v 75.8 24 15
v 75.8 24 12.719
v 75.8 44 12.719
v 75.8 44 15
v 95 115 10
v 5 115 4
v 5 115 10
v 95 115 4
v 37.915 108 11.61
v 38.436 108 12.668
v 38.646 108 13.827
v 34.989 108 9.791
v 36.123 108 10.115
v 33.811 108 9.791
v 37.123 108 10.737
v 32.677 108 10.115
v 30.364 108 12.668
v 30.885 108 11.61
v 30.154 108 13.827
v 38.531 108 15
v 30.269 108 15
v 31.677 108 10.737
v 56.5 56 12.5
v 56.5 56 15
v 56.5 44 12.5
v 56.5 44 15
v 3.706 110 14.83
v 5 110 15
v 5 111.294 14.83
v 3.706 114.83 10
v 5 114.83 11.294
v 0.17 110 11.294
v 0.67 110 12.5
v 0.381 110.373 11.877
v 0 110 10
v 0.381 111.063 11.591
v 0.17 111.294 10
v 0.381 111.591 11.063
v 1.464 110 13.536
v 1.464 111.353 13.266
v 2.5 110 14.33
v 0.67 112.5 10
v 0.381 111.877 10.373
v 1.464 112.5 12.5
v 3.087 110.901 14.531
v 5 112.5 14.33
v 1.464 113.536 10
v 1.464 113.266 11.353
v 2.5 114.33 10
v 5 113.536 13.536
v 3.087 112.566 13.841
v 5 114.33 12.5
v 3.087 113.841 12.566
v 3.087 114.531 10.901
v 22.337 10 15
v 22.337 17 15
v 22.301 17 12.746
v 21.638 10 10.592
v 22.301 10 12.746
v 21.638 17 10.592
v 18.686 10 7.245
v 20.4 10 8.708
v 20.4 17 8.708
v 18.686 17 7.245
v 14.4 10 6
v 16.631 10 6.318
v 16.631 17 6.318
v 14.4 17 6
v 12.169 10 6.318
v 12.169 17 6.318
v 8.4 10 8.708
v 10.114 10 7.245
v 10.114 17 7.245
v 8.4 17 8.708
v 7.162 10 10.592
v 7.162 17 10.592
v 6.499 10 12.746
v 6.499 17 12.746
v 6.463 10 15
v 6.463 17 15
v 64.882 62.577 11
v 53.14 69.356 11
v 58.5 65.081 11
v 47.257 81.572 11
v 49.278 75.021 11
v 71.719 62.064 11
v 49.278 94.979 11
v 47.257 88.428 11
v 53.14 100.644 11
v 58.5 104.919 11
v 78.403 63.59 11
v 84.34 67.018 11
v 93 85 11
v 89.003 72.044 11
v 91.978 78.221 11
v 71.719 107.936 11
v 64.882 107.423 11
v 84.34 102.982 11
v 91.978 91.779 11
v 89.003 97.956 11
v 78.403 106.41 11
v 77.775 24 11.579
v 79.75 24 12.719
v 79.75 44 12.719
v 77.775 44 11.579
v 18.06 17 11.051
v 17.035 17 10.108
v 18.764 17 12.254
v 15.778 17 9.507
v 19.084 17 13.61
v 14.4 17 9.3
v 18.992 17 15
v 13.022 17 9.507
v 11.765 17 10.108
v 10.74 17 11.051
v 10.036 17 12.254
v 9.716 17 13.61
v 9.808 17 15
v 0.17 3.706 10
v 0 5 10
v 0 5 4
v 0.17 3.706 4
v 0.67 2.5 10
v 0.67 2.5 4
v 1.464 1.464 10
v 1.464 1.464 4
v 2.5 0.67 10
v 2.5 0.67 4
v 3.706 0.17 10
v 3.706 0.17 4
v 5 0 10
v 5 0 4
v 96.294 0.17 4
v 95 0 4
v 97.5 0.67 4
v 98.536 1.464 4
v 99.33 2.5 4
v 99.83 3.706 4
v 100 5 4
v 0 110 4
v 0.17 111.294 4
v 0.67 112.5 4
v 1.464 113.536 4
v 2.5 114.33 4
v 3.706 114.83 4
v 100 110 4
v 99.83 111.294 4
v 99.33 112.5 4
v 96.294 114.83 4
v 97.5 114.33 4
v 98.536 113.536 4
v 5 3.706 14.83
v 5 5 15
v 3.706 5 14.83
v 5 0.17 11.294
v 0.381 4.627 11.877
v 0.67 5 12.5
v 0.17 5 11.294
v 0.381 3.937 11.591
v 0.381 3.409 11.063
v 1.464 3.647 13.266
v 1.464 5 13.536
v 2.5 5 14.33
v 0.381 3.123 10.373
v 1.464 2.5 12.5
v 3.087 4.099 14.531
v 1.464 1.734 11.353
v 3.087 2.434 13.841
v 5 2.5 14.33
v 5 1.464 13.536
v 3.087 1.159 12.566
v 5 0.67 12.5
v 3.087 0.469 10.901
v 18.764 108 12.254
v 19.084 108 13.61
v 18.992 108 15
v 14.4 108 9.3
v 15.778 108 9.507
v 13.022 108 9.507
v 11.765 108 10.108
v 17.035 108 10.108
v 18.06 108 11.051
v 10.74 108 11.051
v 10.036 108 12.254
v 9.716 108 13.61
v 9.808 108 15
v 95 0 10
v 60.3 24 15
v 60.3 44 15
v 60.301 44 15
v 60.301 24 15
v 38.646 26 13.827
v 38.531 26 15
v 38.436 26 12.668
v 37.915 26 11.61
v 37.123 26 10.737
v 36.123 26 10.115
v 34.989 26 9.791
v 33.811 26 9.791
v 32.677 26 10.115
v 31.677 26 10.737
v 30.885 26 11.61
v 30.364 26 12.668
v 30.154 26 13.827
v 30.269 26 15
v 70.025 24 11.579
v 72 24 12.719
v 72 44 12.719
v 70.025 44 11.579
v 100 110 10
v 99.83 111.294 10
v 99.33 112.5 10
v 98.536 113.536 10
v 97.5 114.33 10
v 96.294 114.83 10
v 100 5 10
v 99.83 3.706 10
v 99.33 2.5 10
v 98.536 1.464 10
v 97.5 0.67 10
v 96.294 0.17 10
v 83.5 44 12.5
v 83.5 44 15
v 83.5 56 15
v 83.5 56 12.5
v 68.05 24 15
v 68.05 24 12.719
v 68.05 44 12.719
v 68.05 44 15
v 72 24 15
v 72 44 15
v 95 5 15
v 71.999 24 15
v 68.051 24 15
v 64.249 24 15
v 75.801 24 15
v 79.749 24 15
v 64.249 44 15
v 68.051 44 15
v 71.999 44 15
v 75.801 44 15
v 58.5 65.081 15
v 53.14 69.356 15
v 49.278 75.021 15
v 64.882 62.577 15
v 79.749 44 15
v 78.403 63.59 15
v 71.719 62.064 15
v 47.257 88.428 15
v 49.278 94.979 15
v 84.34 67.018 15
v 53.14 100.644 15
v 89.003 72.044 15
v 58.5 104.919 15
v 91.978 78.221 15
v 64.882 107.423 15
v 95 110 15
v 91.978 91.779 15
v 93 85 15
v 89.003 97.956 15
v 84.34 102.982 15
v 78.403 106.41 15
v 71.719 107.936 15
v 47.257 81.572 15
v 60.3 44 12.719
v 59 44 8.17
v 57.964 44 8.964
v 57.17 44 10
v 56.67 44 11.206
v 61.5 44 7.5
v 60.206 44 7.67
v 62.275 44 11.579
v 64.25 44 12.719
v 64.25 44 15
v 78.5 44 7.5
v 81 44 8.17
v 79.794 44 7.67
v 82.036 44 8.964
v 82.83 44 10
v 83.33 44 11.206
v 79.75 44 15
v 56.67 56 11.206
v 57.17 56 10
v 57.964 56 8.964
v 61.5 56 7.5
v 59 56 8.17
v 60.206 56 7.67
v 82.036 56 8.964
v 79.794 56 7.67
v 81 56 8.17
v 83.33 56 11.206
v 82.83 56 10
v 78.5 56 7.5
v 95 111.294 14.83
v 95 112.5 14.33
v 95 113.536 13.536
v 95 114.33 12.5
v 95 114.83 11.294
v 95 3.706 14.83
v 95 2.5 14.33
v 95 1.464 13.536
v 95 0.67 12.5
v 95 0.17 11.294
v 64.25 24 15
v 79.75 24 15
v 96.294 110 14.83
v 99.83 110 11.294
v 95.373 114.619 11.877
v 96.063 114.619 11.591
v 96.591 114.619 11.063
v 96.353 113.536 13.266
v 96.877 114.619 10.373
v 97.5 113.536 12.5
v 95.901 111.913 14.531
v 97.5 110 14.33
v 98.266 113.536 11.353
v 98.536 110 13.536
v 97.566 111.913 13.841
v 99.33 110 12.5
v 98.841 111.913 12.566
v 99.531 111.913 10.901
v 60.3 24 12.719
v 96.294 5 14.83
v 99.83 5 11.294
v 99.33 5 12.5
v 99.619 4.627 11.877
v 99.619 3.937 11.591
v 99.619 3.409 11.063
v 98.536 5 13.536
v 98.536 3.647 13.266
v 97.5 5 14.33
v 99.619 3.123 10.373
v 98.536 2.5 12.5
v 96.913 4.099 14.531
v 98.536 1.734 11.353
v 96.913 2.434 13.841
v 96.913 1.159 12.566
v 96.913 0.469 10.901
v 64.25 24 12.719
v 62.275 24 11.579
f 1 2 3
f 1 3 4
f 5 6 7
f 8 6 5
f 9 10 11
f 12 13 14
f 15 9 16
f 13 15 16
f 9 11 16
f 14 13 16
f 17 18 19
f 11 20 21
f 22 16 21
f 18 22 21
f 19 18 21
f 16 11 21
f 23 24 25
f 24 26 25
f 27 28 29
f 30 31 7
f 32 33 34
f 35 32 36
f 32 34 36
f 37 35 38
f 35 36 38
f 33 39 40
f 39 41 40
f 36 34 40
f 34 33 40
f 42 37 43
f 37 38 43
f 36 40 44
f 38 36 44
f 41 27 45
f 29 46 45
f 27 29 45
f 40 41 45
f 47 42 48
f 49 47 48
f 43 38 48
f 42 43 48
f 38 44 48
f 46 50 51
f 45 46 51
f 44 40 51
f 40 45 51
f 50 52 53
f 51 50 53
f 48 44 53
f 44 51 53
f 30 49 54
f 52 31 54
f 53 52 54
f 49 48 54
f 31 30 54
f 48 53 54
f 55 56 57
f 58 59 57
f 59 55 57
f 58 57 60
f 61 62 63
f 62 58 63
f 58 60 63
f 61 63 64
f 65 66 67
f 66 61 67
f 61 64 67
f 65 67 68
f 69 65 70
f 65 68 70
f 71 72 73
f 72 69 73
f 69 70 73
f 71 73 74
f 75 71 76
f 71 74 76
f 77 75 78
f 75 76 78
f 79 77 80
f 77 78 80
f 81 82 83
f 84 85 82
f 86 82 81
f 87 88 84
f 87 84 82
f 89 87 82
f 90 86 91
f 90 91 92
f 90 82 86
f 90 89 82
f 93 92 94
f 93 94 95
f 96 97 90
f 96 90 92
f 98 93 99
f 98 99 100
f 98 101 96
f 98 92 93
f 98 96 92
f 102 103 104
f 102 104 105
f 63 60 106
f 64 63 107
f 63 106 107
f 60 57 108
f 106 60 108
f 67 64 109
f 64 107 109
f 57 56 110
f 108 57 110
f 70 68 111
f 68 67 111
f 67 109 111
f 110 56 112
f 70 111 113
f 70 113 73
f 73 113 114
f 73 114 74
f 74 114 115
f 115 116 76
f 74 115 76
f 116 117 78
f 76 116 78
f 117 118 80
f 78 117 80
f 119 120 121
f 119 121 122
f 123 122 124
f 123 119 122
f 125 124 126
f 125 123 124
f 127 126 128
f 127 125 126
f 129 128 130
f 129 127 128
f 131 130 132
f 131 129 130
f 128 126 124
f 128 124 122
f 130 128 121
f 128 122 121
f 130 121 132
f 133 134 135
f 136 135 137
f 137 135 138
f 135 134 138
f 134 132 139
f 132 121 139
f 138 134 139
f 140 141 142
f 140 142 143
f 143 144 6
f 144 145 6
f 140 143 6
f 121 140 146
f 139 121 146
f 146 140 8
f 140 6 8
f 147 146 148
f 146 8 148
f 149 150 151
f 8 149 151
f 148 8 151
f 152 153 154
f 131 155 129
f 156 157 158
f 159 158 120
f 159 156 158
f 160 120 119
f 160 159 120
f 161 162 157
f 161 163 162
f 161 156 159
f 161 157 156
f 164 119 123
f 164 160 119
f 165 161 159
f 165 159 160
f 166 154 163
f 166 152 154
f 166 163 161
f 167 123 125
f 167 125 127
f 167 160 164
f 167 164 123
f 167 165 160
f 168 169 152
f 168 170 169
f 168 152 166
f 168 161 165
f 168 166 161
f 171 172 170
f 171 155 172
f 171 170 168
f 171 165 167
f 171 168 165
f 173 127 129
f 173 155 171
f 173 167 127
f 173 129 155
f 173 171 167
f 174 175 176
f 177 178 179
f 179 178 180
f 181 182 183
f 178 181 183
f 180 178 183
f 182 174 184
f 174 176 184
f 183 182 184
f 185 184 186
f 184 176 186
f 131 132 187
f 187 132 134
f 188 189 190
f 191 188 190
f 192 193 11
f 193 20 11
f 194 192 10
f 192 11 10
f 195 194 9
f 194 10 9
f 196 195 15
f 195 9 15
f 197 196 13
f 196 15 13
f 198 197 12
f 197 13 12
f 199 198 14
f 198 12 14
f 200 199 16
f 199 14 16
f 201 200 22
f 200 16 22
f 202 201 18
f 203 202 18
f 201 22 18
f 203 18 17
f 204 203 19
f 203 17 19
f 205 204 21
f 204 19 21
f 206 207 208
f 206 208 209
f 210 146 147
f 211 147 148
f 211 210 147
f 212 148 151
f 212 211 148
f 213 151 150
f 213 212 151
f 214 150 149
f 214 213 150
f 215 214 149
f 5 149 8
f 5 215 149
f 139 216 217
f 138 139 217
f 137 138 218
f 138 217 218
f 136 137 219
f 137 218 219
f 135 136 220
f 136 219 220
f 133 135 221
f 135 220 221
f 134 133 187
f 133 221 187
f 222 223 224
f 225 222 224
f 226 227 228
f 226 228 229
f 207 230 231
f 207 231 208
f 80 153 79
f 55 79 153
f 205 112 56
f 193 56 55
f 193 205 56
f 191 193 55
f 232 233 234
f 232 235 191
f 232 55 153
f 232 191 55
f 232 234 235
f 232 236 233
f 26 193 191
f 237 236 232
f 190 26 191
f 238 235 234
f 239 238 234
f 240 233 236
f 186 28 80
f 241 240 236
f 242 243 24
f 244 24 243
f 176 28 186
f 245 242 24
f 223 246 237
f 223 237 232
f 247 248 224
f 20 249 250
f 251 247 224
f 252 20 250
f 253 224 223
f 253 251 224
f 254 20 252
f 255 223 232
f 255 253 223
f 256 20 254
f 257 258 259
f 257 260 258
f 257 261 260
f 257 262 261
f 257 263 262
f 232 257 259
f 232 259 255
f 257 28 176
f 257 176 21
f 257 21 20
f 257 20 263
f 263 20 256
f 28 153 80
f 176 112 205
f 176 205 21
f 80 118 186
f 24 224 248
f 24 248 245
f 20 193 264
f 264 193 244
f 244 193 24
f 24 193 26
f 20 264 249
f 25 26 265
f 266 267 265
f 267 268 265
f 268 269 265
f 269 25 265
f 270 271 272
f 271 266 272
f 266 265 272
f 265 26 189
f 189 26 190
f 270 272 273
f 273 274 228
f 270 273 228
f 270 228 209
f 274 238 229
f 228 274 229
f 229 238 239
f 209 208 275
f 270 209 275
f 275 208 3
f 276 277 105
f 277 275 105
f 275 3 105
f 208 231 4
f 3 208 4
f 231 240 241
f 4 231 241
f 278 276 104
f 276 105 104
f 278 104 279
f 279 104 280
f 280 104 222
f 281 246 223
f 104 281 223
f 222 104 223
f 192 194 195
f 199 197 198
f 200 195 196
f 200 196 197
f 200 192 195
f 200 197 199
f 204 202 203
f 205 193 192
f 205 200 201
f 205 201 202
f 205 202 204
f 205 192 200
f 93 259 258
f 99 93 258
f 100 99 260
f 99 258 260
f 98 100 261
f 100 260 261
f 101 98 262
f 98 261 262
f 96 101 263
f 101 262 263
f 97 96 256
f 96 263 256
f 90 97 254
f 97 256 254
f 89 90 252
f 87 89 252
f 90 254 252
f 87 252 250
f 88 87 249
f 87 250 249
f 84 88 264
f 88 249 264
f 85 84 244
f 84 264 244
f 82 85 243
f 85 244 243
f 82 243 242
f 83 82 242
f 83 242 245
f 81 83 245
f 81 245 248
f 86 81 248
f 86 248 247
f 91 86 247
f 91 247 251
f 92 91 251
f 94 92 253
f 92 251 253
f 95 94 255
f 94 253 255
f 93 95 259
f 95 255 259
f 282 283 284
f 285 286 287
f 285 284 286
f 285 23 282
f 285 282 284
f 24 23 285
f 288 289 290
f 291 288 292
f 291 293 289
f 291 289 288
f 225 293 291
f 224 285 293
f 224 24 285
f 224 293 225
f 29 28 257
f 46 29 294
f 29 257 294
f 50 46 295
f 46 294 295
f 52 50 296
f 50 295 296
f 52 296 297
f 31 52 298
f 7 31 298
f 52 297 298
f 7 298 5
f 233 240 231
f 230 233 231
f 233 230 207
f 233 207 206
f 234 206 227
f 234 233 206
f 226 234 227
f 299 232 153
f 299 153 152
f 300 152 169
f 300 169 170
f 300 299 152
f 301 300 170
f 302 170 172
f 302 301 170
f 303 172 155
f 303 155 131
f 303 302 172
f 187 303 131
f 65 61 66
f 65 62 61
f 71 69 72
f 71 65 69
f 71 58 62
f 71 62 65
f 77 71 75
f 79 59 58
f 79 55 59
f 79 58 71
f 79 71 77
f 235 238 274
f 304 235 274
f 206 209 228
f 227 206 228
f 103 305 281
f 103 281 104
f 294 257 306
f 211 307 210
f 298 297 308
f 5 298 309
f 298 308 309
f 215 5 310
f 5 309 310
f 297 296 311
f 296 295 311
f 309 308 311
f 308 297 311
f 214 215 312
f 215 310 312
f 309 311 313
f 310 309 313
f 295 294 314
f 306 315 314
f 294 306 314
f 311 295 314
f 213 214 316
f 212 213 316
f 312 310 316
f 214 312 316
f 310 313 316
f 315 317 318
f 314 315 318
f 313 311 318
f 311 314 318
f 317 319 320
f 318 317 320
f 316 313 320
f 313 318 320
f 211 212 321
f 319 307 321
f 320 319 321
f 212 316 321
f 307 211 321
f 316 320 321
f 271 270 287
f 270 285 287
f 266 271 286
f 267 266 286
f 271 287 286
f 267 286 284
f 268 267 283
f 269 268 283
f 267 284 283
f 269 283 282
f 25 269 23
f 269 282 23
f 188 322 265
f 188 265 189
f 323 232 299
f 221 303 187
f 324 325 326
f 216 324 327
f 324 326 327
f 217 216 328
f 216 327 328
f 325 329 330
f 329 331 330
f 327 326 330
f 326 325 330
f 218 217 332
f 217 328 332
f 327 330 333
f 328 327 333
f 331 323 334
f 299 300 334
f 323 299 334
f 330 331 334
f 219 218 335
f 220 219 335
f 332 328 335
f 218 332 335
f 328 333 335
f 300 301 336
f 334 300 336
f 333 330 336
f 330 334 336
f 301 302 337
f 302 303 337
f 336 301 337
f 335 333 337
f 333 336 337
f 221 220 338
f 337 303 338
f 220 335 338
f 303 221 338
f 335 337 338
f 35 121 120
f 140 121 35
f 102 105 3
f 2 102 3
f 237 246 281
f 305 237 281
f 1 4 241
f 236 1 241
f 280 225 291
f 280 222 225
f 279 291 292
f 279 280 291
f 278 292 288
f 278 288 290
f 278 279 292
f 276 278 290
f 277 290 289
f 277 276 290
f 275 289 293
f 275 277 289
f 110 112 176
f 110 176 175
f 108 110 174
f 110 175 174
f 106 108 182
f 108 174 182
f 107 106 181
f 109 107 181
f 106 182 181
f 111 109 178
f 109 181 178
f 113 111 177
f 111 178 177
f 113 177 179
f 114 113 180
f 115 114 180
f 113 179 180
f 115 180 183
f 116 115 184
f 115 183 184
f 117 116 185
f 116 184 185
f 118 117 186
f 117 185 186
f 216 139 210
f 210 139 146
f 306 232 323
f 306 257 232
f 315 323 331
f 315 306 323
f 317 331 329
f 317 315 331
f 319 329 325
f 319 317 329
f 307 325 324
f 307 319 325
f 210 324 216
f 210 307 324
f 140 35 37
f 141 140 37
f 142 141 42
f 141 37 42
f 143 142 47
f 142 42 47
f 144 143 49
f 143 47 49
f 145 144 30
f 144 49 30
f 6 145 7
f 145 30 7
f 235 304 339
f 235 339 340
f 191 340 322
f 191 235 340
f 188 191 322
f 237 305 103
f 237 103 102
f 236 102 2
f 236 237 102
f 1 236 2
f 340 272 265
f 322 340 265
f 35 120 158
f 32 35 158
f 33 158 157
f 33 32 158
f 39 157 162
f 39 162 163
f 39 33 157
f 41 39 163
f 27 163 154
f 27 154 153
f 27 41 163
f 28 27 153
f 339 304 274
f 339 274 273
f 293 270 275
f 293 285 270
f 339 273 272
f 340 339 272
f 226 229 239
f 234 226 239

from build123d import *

# Parameters (mm, degrees)
F0_W      = 100
F0_H      = 115
F1_DEPTH  = 15
F2_R      = 23
F3_DEPTH  = 4
F5_R      = 4.7
F6_DEPTH  = 91
F7_R      = 8
F8_DEPTH  = 7
F9_R      = 4.25
F10_DEPTH = 82
F11_W     = 27
F11_H     = 8
F12_DEPTH = 7.5
F14_DEPTH = 20
F15_DEPTH = 4
F16_R     = 5
F17_DEPTH = 4


with BuildPart() as f1:
    # F0 (on Top) → F1 (new body)
    with BuildSketch(Plane.XY):
        with Locations((50, 57.5)):
            Rectangle(F0_W, F0_H)
    extrude(amount=F1_DEPTH)

    # F2 (on face) → F3 (cut)
    with BuildSketch(Plane.XY.offset(15)):
        with Locations((70, 85)):
            Circle(F2_R)
    extrude(amount=-F3_DEPTH, mode=Mode.SUBTRACT)

    # F5 (on offset) → F6 (cut)
    with BuildSketch(Plane(origin=(0, 108, 0), x_dir=(-1, 0, 0), z_dir=(0, 1, 0))):
        with Locations((-14.4, 14)):
            Circle(F5_R)
    extrude(amount=-F6_DEPTH, mode=Mode.SUBTRACT)

    # F7 (on face) → F8 (cut)
    with BuildSketch(Plane(origin=(0, 17, 0), x_dir=(-1, 0, 0), z_dir=(0, 1, 0))):
        with Locations((-14.4, 14)):
            Circle(F7_R)
        with BuildLine():
            ThreePointArc((-9.8076149987, 15), (-14.4, 9.3), (-18.9923850013, 15))
            Line((-18.9923850013, 15), (-9.8076149987, 15))
        make_face(mode=Mode.SUBTRACT)
        with BuildLine():
            Line((-9.8076149987, 15), (-18.9923850013, 15))
            ThreePointArc((-18.9923850013, 15), (-14.4, 9.3), (-9.8076149987, 15))
        make_face()
    extrude(amount=-F8_DEPTH, mode=Mode.SUBTRACT)

    # F9 (on offset) → F10 (cut)
    with BuildSketch(Plane(origin=(0, 108, 0), x_dir=(-1, 0, 0), z_dir=(0, 1, 0))):
        with Locations((-34.4, 14)):
            Circle(F9_R)
    extrude(amount=-F10_DEPTH, mode=Mode.SUBTRACT)

    # F11 (on face) → F12 (cut)
    with BuildSketch(Plane.XY.offset(15)):
        with Locations((70, 48)):
            Rectangle(F11_W, F11_H)
    extrude(amount=-F12_DEPTH, mode=Mode.SUBTRACT)

    # F13 (on face) → F14 (cut)
    with BuildSketch(Plane(origin=(0, 44, 0), x_dir=(-1, 0, 0), z_dir=(0, 1, 0))):
        Polygon((-79.75, 14.9995335633), (-79.75, 12.719), (-77.775, 11.5787332184), (-75.8, 12.719), (-75.8, 14.9995335633), (-75.8008078921, 15), (-79.7491921079, 15), align=None)
        Polygon((-68.0508078921, 15), (-71.9991921079, 15), (-72, 14.9995335633), (-72, 12.719), (-70.025, 11.5787332184), (-68.05, 12.719), (-68.05, 14.9995335633), align=None)
        Polygon((-60.3008078921, 15), (-64.2491921079, 15), (-64.25, 14.9995335633), (-64.25, 12.719), (-62.275, 11.5787332184), (-60.3, 12.719), (-60.3, 14.9995335633), align=None)
    extrude(amount=-F14_DEPTH, mode=Mode.SUBTRACT)

    # F15 (cut): a face of the model
    f15_faces = [f1.faces().sort_by_distance(p)[0] for p in [
        (70, 52, 11.25),
    ]]
    extrude(f15_faces, amount=-F15_DEPTH, mode=Mode.SUBTRACT)

    # F16
    f16_edges = [f1.edges().sort_by_distance(p)[0] for p in [
        (50, 0, 15),
        (100, 57.5, 15),
        (50, 115, 15),
        (0, 57.5, 15),
        (100, 115, 7.5),
        (0, 115, 7.5),
        (100, 0, 7.5),
        (0, 0, 7.5),
        (56.5, 50, 7.5),
        (83.5, 50, 7.5),
    ]]
    fillet(f16_edges, radius=F16_R)

    # F17 (cut): a face of the model
    f17_faces = [f1.faces().sort_by_distance(p)[0] for p in [
        (50, 57.5, 0),
    ]]
    extrude(f17_faces, amount=-F17_DEPTH, mode=Mode.SUBTRACT)


solid = f1.part
